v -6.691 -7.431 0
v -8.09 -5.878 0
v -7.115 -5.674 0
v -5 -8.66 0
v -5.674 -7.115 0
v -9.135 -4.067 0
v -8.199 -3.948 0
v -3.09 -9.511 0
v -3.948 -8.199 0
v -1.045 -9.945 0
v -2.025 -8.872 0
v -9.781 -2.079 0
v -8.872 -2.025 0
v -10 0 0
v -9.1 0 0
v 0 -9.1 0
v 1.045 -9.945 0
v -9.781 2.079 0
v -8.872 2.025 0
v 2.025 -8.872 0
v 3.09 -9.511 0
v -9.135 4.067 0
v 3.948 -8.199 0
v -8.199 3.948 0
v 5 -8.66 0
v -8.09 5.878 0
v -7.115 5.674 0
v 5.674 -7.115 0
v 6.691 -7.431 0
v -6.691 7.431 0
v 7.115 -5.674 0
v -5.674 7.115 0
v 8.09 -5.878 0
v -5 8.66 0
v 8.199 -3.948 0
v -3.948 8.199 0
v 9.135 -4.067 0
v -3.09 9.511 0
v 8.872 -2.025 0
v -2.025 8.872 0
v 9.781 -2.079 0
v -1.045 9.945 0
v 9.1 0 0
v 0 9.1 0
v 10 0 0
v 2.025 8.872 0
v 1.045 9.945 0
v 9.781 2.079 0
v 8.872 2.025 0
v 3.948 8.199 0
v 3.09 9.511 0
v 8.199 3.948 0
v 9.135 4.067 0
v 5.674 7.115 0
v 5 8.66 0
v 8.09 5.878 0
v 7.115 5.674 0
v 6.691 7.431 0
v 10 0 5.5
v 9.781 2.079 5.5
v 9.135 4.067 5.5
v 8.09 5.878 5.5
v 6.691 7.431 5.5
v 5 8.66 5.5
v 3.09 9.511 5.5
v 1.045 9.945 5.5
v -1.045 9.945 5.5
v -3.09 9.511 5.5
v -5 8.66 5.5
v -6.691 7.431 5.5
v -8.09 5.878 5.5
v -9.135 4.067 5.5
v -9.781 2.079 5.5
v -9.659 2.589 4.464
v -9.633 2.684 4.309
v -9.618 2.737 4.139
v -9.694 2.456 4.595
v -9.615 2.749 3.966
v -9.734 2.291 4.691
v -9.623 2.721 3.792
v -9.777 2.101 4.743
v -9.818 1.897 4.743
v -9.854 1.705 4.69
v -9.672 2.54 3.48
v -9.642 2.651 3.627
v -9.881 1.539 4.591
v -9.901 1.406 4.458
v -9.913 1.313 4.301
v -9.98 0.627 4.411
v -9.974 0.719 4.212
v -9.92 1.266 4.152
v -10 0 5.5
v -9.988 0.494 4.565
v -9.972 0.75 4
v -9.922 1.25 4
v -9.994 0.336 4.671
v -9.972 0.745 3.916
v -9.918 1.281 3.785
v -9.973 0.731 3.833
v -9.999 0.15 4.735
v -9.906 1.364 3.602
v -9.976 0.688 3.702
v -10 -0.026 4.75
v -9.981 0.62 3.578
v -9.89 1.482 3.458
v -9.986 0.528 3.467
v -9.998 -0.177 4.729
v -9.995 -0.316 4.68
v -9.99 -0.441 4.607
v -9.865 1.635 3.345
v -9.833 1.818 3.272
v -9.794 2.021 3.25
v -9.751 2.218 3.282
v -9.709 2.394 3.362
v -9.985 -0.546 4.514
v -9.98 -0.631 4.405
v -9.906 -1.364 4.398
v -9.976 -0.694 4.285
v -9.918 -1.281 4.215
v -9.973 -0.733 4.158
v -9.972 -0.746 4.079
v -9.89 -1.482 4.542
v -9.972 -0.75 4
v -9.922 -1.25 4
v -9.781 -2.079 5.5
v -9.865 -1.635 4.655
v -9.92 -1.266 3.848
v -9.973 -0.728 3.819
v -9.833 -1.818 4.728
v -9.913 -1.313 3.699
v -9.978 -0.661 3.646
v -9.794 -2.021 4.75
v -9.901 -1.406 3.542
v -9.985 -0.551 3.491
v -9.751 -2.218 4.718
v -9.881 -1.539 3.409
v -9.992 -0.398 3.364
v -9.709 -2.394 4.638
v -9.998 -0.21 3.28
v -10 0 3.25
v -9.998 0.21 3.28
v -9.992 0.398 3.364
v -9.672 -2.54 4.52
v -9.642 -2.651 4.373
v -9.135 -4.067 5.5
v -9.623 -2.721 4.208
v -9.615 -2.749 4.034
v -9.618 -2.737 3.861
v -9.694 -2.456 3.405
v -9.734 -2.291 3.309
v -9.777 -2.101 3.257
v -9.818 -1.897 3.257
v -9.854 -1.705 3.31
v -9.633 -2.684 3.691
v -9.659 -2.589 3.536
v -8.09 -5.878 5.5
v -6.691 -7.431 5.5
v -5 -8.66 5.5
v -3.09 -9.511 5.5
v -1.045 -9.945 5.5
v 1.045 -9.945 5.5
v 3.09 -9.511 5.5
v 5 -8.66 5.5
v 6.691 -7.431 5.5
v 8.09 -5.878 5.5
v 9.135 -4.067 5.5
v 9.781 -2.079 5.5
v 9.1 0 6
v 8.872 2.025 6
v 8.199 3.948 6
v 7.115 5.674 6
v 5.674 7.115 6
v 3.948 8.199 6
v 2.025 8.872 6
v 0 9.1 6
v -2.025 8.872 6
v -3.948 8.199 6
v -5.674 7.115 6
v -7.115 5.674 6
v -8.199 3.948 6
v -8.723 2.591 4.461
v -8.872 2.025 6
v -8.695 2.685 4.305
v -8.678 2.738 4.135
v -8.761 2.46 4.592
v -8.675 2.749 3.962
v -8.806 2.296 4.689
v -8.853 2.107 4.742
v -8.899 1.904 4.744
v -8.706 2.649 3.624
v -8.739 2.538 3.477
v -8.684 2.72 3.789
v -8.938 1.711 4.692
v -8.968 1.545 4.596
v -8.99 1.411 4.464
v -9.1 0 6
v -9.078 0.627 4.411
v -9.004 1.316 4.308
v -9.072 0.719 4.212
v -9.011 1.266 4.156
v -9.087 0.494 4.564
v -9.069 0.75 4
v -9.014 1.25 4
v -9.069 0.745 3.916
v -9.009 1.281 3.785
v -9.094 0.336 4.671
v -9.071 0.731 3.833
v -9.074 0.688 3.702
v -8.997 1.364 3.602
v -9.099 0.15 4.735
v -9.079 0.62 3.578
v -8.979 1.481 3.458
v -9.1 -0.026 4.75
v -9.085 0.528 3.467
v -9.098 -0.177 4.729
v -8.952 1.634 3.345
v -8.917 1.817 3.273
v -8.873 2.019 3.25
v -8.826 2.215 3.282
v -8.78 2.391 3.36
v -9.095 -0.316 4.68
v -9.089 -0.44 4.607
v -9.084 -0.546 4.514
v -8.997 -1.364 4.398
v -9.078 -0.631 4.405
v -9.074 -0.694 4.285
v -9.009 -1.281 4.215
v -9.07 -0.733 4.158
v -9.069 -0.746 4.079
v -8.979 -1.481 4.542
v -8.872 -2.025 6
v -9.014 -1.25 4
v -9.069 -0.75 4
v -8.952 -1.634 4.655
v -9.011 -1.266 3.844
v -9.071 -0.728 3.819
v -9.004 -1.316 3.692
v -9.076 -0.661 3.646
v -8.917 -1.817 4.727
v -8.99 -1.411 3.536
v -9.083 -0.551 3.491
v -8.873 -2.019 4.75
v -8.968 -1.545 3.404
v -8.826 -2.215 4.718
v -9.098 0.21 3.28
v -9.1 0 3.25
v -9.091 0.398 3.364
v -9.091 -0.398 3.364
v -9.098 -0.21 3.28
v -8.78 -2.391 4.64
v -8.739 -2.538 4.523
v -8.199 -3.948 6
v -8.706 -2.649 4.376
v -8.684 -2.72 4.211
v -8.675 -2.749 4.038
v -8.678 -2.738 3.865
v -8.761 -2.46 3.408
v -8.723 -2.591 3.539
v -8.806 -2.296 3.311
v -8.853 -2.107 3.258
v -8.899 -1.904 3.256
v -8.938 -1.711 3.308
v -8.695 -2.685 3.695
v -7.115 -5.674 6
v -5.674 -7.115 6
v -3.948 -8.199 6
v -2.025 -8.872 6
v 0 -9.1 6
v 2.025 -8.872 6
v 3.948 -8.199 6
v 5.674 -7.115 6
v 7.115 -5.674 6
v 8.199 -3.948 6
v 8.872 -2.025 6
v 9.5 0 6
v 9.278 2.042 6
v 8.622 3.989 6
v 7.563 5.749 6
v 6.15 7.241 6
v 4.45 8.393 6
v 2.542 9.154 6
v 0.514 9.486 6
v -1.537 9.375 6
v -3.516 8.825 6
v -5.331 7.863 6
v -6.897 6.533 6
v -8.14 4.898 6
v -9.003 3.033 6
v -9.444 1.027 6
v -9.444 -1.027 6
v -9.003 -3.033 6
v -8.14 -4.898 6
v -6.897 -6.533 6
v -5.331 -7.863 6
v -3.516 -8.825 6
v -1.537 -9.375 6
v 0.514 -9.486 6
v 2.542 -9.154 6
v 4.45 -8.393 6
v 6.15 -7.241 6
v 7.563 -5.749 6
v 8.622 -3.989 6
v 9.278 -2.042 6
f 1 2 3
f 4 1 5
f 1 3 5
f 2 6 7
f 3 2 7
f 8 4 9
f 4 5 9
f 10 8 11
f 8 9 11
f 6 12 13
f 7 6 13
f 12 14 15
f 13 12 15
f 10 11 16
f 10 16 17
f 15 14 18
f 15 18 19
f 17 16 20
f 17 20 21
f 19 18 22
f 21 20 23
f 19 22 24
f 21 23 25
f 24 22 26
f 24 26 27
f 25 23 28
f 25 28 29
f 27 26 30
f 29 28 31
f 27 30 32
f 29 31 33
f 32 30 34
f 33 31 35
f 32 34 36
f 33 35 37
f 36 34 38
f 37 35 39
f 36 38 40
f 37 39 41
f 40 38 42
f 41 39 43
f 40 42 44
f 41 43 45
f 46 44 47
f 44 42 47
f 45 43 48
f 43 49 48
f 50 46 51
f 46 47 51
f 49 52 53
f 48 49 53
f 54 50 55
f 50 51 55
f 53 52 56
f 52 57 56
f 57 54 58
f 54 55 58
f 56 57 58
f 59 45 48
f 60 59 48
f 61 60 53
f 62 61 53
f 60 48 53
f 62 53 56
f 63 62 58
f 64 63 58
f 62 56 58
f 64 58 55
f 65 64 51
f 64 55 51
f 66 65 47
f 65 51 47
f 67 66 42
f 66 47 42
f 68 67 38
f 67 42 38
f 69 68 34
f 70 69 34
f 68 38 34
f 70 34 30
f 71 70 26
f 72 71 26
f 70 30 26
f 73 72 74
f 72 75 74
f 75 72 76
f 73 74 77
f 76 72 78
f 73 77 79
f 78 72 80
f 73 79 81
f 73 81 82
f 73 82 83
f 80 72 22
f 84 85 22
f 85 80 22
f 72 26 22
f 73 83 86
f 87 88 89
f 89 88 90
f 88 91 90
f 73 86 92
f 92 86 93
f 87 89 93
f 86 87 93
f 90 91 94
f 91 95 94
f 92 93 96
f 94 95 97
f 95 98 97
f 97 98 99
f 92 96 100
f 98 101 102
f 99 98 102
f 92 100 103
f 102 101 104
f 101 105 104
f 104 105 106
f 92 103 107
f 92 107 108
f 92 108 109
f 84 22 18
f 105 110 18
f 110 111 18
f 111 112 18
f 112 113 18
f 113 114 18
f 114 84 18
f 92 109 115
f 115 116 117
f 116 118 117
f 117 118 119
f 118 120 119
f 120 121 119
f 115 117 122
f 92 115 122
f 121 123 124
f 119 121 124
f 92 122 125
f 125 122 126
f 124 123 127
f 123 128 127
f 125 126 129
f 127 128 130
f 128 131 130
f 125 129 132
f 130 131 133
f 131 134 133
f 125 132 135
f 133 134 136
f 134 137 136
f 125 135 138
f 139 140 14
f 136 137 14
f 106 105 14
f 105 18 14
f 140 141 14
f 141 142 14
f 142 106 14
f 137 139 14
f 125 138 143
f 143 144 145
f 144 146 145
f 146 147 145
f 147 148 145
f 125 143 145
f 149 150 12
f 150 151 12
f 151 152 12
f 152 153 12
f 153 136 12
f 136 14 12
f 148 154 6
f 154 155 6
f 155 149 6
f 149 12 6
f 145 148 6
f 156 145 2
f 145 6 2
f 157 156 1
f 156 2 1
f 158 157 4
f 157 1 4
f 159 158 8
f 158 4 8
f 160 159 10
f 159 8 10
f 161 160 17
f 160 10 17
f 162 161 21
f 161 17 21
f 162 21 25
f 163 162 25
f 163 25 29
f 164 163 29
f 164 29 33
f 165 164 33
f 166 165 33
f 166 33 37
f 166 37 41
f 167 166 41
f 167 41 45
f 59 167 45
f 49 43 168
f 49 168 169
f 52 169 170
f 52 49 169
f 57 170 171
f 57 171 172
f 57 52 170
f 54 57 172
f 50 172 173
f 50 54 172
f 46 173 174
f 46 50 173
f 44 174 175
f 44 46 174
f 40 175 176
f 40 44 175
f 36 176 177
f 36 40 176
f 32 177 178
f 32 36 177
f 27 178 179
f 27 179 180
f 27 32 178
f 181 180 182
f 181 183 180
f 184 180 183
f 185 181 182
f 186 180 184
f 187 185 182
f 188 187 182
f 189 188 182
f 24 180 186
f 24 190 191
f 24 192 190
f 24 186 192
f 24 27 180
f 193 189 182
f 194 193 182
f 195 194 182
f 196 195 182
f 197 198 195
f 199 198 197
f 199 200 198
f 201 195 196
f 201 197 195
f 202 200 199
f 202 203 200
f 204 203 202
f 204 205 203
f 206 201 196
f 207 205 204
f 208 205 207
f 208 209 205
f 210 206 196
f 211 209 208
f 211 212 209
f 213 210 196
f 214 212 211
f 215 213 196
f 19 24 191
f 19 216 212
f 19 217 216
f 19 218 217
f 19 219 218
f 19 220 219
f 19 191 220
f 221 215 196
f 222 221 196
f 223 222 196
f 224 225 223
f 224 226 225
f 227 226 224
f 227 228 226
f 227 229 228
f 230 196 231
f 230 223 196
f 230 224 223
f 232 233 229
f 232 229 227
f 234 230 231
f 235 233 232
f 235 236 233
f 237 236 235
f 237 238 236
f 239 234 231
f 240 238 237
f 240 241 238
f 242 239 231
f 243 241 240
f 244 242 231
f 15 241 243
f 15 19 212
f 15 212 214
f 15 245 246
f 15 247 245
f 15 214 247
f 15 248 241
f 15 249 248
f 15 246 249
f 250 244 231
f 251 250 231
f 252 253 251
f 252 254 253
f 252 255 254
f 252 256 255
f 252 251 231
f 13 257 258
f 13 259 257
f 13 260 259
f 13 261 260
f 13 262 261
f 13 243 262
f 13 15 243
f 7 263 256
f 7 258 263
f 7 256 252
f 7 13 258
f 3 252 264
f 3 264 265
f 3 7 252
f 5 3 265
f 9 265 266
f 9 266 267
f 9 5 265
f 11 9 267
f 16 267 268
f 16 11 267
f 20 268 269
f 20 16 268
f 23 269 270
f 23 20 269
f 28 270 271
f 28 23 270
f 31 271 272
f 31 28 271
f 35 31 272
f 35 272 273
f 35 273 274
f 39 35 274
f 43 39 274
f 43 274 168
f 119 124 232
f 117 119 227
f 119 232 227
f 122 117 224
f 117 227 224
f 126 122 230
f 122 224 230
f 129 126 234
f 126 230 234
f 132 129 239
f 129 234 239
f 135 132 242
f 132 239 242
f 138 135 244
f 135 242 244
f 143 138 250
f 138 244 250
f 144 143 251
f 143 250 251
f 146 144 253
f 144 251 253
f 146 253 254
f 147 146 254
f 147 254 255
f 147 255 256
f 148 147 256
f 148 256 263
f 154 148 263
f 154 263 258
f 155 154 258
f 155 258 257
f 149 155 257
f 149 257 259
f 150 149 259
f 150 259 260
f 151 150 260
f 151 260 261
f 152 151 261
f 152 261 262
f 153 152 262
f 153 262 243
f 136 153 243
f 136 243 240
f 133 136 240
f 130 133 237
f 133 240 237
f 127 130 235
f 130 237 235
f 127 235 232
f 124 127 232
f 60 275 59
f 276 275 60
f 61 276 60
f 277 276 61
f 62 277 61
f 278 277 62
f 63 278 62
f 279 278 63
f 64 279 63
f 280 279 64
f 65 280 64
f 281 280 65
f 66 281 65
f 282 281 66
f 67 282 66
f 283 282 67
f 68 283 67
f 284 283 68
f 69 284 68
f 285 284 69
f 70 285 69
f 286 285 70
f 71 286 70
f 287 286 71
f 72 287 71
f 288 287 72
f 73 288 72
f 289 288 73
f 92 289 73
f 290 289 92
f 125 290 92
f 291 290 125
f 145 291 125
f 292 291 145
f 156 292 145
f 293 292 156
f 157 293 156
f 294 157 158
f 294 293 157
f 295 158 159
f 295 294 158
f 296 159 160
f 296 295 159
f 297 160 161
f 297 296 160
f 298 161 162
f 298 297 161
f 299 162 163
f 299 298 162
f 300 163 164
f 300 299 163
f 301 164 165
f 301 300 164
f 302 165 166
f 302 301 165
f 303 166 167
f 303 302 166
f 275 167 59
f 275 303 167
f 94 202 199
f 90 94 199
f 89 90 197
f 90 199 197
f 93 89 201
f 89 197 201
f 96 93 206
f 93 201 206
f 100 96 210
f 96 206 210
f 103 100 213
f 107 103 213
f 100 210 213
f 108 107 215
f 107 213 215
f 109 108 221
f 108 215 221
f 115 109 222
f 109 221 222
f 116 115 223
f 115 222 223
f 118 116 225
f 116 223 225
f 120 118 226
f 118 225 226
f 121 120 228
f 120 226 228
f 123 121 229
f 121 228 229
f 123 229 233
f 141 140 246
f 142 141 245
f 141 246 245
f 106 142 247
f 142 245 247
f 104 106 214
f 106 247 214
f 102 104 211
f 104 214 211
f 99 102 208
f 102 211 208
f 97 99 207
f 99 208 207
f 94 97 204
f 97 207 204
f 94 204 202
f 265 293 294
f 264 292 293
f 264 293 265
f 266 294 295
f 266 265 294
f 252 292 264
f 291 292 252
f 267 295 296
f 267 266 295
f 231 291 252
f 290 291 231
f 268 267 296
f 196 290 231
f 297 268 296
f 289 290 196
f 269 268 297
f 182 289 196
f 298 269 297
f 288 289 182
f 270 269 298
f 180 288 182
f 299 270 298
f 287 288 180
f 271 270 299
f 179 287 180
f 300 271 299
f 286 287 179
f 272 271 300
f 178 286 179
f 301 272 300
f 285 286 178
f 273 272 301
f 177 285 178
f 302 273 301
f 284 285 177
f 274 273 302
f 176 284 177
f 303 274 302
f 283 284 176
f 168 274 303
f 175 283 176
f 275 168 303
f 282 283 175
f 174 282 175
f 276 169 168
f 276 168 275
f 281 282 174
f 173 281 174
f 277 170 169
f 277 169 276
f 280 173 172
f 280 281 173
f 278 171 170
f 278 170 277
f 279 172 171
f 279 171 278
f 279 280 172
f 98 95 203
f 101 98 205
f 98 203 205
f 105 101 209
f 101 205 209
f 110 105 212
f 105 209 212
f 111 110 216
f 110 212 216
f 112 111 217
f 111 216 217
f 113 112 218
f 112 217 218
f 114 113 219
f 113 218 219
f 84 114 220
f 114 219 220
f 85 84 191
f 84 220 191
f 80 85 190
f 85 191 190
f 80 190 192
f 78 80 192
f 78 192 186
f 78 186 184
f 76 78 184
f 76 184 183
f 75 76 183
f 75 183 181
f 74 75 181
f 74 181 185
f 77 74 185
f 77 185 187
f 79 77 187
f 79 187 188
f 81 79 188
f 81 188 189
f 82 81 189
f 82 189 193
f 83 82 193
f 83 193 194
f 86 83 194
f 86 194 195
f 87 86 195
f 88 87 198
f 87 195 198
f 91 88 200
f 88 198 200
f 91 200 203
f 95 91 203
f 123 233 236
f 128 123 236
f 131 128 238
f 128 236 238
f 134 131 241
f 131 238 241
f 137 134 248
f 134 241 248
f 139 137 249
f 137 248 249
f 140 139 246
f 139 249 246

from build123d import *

# Parameters (mm, degrees)
F0_R     = 10
F0_R_2   = 9.1
F1_DEPTH = 6
F2_R     = 0.75
F3_DEPTH = 25
F4_SIZE  = 0.5


with BuildPart() as f1:
    # F0 (on Top) → F1 (new body)
    with BuildSketch(Plane.XY):
        Circle(F0_R)
        Circle(F0_R_2, mode=Mode.SUBTRACT)
    extrude(amount=F1_DEPTH)

    # F2 (on Right) → F3 (cut)
    with BuildSketch(Plane.YZ):
        with BuildLine():
            ThreePointArc((2.75, 4), (2, 4.75), (1.25, 4))
            ThreePointArc((1.25, 4), (2, 3.25), (2.75, 4))
        make_face()
        with BuildLine():
            Line((0, 4), (0, 3.25))
            ThreePointArc((0, 3.25), (0.53033, 3.46967), (0.75, 4))
            Line((0.75, 4), (0, 4))
        make_face()
        with BuildLine():
            Line((-0.75, 4), (0, 4))
            Line((0, 4), (0.75, 4))
            ThreePointArc((0.75, 4), (0, 4.75), (-0.75, 4))
        make_face()
        with BuildLine():
            ThreePointArc((-0.75, 4), (-0.53033, 3.46967), (0, 3.25))
            Line((0, 3.25), (0, 4))
            Line((0, 4), (-0.75, 4))
        make_face()
        with Locations((-2, 4)):
            Circle(F2_R)
    extrude(amount=-F3_DEPTH, mode=Mode.SUBTRACT)

    # F4
    f4_edges = [f1.edges().sort_by_distance(p)[0] for p in [
        (-10, 0, 6),
    ]]
    chamfer(f4_edges, length=F4_SIZE)


solid = f1.part
